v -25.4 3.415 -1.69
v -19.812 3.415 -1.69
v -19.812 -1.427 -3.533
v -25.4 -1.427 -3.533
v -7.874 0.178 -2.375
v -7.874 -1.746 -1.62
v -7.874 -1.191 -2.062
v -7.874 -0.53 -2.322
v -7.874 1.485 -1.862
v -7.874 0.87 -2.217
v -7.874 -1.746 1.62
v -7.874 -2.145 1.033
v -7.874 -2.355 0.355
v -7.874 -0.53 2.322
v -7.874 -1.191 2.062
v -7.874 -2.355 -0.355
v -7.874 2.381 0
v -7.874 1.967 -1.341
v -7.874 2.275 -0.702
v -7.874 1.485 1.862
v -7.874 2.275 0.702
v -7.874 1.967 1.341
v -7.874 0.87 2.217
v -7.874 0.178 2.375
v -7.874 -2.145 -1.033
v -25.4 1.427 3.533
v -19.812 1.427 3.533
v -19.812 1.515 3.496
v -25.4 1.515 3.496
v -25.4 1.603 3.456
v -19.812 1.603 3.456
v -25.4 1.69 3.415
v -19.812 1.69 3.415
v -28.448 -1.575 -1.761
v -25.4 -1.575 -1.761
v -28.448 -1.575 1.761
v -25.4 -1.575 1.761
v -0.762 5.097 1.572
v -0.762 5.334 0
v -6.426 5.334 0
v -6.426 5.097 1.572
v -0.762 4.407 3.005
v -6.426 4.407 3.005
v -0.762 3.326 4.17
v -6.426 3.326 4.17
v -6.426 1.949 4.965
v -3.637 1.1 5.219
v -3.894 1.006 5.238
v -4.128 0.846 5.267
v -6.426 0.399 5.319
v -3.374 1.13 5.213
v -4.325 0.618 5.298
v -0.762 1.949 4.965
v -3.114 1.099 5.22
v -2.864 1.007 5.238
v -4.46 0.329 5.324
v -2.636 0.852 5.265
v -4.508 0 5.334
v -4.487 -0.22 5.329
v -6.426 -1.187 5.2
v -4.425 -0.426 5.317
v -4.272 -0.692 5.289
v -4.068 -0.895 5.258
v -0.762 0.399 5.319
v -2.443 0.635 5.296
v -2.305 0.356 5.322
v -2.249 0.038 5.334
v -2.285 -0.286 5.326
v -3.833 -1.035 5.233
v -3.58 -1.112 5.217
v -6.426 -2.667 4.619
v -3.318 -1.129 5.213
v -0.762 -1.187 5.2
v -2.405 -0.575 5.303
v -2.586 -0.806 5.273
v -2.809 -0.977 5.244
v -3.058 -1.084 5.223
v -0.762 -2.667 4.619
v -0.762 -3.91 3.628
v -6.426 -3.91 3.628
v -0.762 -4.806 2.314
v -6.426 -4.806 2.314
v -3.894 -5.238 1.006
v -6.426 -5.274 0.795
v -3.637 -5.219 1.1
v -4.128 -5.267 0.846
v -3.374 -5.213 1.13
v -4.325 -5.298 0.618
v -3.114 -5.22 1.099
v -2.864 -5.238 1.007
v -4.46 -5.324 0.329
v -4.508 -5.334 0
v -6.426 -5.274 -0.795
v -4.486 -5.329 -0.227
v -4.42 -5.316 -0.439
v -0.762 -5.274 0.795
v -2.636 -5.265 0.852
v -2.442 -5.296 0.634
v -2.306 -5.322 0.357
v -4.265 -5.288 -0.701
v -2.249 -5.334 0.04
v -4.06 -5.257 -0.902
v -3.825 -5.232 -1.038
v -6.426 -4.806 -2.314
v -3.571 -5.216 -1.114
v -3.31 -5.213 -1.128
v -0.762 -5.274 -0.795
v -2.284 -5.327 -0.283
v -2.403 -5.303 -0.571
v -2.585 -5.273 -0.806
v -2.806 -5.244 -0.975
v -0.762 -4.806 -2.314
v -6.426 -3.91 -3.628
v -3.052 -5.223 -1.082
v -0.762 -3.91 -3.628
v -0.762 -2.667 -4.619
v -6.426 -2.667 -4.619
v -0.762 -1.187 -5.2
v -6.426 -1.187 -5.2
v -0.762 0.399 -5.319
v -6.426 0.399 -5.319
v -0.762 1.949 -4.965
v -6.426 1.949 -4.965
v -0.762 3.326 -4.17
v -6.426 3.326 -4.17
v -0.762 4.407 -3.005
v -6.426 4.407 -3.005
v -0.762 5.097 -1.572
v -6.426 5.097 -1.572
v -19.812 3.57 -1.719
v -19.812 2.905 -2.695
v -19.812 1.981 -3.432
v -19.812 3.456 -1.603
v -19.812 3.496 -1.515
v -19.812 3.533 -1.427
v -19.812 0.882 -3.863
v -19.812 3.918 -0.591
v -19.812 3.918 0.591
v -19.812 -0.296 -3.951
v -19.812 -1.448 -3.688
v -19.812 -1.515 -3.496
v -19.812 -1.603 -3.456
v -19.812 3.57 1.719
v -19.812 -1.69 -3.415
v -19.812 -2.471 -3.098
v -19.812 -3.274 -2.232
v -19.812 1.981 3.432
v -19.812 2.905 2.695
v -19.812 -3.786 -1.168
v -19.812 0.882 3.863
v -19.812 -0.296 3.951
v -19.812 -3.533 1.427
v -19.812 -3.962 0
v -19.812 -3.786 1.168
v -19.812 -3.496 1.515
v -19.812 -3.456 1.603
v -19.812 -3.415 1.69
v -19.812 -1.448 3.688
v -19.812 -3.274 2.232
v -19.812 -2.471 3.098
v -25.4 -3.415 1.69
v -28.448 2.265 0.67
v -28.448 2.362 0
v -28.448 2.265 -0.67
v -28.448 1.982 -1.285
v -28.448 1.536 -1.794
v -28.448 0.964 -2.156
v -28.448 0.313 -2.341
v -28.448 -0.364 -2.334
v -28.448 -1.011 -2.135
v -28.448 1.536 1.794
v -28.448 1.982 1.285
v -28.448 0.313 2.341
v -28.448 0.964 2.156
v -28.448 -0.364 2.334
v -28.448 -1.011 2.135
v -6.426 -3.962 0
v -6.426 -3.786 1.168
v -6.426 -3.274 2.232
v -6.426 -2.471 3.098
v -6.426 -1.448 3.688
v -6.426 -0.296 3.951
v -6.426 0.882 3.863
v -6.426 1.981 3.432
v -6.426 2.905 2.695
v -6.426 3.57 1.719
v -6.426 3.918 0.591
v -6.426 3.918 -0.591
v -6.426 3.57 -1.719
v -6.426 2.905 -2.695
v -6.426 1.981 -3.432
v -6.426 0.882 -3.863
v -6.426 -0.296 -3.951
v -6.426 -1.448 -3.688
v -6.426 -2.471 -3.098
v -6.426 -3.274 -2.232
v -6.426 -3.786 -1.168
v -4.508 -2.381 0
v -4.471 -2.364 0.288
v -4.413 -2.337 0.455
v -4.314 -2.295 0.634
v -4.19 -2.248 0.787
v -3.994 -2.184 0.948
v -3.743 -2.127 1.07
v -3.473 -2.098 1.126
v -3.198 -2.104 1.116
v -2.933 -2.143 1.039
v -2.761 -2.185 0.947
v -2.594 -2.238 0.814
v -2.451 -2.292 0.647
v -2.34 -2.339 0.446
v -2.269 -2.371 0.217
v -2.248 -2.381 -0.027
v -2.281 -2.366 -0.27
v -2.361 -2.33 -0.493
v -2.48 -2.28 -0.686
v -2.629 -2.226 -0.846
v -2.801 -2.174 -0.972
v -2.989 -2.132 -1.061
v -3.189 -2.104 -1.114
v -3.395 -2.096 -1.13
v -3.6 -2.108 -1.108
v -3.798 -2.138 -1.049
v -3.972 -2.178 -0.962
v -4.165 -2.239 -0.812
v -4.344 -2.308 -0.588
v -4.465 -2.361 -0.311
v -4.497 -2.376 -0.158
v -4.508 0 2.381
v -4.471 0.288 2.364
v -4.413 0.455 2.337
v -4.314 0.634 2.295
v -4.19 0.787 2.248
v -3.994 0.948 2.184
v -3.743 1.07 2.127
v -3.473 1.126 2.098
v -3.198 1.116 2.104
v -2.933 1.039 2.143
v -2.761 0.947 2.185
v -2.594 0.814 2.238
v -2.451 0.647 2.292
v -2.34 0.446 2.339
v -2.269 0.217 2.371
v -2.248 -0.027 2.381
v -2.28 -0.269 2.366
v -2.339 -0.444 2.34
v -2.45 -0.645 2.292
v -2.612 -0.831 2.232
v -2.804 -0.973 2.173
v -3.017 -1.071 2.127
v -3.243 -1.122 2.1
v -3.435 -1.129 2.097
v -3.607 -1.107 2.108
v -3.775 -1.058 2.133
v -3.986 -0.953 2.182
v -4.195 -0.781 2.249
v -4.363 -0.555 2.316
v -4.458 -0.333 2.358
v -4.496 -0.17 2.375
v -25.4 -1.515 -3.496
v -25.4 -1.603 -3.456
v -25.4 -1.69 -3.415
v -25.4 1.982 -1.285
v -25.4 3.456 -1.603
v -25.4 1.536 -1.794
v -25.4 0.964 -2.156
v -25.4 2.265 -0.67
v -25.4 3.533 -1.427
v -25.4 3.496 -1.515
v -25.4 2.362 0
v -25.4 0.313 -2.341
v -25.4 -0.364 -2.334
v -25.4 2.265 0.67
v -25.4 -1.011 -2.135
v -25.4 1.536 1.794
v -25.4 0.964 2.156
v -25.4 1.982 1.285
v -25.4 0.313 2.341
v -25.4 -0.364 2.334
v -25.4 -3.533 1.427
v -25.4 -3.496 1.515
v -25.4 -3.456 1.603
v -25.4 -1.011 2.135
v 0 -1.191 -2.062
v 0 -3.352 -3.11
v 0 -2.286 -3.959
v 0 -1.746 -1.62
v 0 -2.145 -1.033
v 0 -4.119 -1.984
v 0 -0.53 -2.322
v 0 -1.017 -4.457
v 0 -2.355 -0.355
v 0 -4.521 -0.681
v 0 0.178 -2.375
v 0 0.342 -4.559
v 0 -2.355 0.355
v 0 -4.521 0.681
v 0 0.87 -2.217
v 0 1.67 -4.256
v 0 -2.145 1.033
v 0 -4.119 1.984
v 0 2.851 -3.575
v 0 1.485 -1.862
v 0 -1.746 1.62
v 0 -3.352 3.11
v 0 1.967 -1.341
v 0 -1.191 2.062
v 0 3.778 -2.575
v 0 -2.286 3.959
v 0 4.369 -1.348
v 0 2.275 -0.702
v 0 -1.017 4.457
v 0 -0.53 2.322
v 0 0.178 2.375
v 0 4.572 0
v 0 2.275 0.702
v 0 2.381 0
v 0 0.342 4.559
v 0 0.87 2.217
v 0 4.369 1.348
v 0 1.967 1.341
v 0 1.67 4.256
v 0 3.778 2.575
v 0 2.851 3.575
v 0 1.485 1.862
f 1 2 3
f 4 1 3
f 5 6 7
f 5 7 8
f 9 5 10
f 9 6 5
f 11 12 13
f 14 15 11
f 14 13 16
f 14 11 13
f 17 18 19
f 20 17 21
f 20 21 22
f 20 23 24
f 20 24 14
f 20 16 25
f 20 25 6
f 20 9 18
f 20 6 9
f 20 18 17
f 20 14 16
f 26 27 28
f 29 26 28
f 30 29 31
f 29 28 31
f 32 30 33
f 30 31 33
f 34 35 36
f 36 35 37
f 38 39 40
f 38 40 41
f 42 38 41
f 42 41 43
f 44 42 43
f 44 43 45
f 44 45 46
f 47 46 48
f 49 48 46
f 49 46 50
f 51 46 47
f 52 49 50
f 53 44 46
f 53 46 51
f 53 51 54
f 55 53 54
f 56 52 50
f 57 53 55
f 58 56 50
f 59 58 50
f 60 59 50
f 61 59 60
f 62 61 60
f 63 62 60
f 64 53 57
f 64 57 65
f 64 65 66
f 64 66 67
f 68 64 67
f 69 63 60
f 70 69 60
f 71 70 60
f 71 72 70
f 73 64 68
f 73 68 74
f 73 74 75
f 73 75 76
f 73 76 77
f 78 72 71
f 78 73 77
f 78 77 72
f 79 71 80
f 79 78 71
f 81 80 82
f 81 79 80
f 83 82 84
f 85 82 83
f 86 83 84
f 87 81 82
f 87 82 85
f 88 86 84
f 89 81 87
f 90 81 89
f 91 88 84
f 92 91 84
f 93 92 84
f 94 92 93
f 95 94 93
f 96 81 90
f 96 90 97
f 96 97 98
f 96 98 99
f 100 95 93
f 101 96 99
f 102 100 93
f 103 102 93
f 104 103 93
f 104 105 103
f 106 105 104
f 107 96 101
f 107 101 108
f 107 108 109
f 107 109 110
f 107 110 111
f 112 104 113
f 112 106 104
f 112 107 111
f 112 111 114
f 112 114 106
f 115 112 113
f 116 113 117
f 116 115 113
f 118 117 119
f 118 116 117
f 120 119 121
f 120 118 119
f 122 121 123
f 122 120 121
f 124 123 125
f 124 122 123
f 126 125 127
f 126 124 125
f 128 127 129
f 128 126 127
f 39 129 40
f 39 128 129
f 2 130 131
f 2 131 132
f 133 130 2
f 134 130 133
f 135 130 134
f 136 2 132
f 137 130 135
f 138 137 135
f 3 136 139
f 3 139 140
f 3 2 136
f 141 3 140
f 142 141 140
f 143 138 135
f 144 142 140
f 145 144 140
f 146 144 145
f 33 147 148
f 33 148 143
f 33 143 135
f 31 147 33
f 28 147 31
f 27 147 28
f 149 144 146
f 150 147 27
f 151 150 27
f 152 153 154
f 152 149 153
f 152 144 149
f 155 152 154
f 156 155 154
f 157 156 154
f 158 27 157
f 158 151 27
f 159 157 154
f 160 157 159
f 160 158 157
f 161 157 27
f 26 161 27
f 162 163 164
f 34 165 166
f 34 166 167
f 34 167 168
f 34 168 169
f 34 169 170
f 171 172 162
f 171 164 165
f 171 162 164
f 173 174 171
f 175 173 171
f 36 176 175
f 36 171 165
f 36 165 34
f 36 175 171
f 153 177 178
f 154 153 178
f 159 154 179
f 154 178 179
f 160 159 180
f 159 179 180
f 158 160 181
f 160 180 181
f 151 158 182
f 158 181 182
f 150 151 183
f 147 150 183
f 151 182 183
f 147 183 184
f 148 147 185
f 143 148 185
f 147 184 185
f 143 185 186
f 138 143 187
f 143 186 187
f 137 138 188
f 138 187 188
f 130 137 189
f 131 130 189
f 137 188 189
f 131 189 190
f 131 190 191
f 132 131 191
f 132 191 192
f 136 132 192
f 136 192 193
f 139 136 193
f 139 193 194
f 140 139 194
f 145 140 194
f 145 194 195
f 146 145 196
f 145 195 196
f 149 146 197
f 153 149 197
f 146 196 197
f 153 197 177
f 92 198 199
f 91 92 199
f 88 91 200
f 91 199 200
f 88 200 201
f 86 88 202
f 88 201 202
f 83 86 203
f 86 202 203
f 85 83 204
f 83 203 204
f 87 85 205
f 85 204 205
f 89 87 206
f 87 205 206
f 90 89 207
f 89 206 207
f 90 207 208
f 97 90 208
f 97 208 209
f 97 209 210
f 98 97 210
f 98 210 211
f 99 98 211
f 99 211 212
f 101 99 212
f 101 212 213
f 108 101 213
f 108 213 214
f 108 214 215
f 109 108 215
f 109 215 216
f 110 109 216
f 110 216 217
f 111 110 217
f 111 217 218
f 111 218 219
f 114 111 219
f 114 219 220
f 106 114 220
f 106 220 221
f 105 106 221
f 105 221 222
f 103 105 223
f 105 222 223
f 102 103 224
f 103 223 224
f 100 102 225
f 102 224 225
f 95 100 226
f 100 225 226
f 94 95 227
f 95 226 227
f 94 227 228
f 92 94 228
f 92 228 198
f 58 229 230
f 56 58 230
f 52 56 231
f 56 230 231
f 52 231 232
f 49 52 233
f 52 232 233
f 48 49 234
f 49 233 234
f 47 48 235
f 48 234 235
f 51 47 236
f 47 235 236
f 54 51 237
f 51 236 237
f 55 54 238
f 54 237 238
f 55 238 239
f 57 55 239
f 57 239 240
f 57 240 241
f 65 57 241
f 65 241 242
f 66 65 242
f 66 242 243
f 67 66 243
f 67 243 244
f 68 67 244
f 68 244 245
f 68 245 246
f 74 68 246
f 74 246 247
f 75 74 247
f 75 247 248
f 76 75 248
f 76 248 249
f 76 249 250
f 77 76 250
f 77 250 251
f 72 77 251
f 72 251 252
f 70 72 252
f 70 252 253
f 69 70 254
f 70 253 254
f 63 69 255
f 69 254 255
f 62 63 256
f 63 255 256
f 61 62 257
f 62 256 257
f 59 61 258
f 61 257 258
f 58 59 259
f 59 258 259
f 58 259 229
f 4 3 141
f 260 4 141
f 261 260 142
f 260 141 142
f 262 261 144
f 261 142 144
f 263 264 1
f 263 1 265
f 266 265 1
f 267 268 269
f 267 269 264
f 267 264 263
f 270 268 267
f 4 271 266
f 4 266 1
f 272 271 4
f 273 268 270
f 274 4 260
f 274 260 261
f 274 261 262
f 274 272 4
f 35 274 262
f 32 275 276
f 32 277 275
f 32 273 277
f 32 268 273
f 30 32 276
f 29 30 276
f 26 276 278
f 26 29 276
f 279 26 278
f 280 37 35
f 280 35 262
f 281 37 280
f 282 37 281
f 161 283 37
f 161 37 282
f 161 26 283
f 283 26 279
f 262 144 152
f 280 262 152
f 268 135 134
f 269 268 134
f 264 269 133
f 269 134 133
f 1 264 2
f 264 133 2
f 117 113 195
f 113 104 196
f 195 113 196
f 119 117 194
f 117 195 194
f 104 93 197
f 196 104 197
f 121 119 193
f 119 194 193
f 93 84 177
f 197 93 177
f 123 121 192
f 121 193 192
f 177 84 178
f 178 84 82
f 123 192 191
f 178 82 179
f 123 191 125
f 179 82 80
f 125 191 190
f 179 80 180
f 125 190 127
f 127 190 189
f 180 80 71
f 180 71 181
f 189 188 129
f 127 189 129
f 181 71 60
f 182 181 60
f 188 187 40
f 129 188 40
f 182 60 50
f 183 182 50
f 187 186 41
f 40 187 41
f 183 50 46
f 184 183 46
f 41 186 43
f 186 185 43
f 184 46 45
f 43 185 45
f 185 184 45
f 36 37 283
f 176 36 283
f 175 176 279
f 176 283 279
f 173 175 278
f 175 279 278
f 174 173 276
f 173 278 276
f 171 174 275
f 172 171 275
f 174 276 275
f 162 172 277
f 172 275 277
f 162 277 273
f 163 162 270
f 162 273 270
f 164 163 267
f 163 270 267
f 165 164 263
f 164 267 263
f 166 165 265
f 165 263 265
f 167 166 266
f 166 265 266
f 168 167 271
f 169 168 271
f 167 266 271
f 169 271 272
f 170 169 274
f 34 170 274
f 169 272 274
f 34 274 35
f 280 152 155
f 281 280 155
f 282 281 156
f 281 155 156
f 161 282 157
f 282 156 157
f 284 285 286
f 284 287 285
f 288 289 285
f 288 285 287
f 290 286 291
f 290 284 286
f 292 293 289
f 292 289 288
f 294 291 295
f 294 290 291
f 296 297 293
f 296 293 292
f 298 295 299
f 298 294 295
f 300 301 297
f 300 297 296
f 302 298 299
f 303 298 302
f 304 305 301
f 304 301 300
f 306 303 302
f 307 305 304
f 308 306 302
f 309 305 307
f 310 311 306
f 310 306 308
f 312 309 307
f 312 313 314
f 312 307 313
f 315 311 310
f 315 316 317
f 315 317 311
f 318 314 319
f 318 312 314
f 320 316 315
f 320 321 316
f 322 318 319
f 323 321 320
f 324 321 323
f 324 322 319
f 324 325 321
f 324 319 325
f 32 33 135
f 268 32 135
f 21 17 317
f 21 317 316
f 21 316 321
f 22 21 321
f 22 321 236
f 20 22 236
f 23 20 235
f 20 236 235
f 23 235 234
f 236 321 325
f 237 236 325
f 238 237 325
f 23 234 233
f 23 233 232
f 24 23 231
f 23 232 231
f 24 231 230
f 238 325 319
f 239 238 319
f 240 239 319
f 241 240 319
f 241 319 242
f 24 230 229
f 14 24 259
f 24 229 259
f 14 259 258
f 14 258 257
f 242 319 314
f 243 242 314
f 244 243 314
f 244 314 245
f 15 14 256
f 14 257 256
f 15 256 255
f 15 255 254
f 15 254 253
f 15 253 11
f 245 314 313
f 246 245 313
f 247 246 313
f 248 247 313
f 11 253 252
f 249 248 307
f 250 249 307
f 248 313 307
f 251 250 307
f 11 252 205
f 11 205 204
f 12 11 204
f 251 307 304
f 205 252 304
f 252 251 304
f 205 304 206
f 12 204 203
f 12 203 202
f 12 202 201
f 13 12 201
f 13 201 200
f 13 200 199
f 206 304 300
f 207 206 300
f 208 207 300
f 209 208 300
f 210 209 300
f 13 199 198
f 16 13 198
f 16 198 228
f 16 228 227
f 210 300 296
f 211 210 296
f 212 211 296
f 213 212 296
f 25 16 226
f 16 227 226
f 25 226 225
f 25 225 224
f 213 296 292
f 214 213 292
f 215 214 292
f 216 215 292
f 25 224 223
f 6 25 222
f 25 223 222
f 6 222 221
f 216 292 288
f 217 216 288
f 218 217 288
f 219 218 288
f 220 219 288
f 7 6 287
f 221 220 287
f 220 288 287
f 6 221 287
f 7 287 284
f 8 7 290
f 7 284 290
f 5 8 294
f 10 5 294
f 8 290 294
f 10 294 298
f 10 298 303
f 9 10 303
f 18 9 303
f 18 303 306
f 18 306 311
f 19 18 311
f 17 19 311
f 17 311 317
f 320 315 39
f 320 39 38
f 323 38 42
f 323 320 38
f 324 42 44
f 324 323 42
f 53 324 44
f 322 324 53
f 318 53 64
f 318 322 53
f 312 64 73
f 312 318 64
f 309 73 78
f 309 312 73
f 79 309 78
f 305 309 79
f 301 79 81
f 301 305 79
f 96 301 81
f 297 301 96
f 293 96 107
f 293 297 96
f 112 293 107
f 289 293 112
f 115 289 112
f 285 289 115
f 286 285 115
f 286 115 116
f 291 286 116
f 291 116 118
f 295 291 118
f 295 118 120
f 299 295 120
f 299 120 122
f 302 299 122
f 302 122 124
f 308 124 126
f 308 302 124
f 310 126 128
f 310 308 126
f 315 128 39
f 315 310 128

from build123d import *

# Parameters (mm, degrees)
F0_R      = 5.334
F1_DEPTH  = 6.4262
F2_R      = 3.9624
F3_DEPTH  = 13.3858
F5_DEPTH  = 5.588
F7_DEPTH  = 3.048
F8_SIZE2  = 0.762
F8_SIZE   = 0.762
F9_R      = 2.38125
F10_DEPTH = 7.874
F13_D     = 2.2606
F13_DEPTH = 6.477
F13_START = 0.1211335
F13_TIP   = 0.6791527577
F16_D     = 2.2606
F16_DEPTH = 6.477
F16_START = 0.1211335
F16_TIP   = 0.6791527577


with BuildPart() as f1:
    # F0 (on Right) → F1 (new body)
    with BuildSketch(Plane.YZ):
        Circle(F0_R)
    extrude(amount=-F1_DEPTH)

    # F2 (on face) → F3 (join)
    with BuildSketch(Plane(origin=(-6.4262, 0, 0), x_dir=(0, -1, 0), z_dir=(-1, 0, 0))):
        Circle(F2_R)
    extrude(amount=F3_DEPTH)

    # F4 (on face) → F5 (join)
    with BuildSketch(Plane(origin=(-19.812, 0, 0), x_dir=(0, -1, 0), z_dir=(-1, 0, 0))):
        with BuildLine():
            Line((3.4148820894, 1.6895799227), (-1.4267371035, 3.5327781189))
            ThreePointArc((-1.4267371035, 3.5327781189), (-1.5592731706, 3.4763151726), (-1.6895799227, 3.4148820894))
            Line((-1.6895799227, 3.4148820894), (-3.5327781189, -1.4267371035))
            ThreePointArc((-3.5327781189, -1.4267371035), (-3.4763151726, -1.5592731706), (-3.4148820894, -1.6895799227))
            Line((-3.4148820894, -1.6895799227), (1.4267371035, -3.5327781189))
            ThreePointArc((1.4267371035, -3.5327781189), (1.5592731706, -3.4763151726), (1.6895799227, -3.4148820894))
            Line((1.6895799227, -3.4148820894), (3.5327781189, 1.4267371035))
            ThreePointArc((3.5327781189, 1.4267371035), (3.4763151726, 1.5592731706), (3.4148820894, 1.6895799227))
        make_face()
    extrude(amount=F5_DEPTH)

    # F6 (on face) → F7 (join)
    with BuildSketch(Plane(origin=(-25.4, 0, 0), x_dir=(0, -1, 0), z_dir=(-1, 0, 0))):
        with BuildLine():
            Line((1.5748, -1.7606799255), (1.5748, 1.7606799255))
            ThreePointArc((1.5748, 1.7606799255), (-2.3622, 0), (1.5748, -1.7606799255))
        make_face()
    extrude(amount=F7_DEPTH)

    # F8
    f8_edges = [f1.edges().sort_by_distance(p)[0] for p in [
        (0, -5.334, 0),
    ]]
    chamfer(f8_edges, length=F8_SIZE, length2=F8_SIZE2)

    # F9 (on face) → F10 (cut)
    with BuildSketch(Plane.YZ):
        Circle(F9_R)
    extrude(amount=-F10_DEPTH, mode=Mode.SUBTRACT)

    # F13
    # its depths count from where the whole tool has entered the part; down to there all is cleared
    with Locations(Plane.XZ.offset(5.334).offset(-F13_START)):
        with Locations((-3.3782, 0)):
            Hole(F13_D / 2, depth=F13_DEPTH)
            with Locations((0, 0, -(F13_DEPTH + F13_TIP / 2))):  # 118° drill point
                Cone(0, F13_D / 2, F13_TIP, mode=Mode.SUBTRACT)

    # F16
    # its depths count from where the whole tool has entered the part; down to there all is cleared
    with Locations(Plane.XY.offset(5.334).offset(-F16_START)):
        with Locations((-3.3782, 0)):
            Hole(F16_D / 2, depth=F16_DEPTH)
            with Locations((0, 0, -(F16_DEPTH + F16_TIP / 2))):  # 118° drill point
                Cone(0, F16_D / 2, F16_TIP, mode=Mode.SUBTRACT)


solid = f1.part
